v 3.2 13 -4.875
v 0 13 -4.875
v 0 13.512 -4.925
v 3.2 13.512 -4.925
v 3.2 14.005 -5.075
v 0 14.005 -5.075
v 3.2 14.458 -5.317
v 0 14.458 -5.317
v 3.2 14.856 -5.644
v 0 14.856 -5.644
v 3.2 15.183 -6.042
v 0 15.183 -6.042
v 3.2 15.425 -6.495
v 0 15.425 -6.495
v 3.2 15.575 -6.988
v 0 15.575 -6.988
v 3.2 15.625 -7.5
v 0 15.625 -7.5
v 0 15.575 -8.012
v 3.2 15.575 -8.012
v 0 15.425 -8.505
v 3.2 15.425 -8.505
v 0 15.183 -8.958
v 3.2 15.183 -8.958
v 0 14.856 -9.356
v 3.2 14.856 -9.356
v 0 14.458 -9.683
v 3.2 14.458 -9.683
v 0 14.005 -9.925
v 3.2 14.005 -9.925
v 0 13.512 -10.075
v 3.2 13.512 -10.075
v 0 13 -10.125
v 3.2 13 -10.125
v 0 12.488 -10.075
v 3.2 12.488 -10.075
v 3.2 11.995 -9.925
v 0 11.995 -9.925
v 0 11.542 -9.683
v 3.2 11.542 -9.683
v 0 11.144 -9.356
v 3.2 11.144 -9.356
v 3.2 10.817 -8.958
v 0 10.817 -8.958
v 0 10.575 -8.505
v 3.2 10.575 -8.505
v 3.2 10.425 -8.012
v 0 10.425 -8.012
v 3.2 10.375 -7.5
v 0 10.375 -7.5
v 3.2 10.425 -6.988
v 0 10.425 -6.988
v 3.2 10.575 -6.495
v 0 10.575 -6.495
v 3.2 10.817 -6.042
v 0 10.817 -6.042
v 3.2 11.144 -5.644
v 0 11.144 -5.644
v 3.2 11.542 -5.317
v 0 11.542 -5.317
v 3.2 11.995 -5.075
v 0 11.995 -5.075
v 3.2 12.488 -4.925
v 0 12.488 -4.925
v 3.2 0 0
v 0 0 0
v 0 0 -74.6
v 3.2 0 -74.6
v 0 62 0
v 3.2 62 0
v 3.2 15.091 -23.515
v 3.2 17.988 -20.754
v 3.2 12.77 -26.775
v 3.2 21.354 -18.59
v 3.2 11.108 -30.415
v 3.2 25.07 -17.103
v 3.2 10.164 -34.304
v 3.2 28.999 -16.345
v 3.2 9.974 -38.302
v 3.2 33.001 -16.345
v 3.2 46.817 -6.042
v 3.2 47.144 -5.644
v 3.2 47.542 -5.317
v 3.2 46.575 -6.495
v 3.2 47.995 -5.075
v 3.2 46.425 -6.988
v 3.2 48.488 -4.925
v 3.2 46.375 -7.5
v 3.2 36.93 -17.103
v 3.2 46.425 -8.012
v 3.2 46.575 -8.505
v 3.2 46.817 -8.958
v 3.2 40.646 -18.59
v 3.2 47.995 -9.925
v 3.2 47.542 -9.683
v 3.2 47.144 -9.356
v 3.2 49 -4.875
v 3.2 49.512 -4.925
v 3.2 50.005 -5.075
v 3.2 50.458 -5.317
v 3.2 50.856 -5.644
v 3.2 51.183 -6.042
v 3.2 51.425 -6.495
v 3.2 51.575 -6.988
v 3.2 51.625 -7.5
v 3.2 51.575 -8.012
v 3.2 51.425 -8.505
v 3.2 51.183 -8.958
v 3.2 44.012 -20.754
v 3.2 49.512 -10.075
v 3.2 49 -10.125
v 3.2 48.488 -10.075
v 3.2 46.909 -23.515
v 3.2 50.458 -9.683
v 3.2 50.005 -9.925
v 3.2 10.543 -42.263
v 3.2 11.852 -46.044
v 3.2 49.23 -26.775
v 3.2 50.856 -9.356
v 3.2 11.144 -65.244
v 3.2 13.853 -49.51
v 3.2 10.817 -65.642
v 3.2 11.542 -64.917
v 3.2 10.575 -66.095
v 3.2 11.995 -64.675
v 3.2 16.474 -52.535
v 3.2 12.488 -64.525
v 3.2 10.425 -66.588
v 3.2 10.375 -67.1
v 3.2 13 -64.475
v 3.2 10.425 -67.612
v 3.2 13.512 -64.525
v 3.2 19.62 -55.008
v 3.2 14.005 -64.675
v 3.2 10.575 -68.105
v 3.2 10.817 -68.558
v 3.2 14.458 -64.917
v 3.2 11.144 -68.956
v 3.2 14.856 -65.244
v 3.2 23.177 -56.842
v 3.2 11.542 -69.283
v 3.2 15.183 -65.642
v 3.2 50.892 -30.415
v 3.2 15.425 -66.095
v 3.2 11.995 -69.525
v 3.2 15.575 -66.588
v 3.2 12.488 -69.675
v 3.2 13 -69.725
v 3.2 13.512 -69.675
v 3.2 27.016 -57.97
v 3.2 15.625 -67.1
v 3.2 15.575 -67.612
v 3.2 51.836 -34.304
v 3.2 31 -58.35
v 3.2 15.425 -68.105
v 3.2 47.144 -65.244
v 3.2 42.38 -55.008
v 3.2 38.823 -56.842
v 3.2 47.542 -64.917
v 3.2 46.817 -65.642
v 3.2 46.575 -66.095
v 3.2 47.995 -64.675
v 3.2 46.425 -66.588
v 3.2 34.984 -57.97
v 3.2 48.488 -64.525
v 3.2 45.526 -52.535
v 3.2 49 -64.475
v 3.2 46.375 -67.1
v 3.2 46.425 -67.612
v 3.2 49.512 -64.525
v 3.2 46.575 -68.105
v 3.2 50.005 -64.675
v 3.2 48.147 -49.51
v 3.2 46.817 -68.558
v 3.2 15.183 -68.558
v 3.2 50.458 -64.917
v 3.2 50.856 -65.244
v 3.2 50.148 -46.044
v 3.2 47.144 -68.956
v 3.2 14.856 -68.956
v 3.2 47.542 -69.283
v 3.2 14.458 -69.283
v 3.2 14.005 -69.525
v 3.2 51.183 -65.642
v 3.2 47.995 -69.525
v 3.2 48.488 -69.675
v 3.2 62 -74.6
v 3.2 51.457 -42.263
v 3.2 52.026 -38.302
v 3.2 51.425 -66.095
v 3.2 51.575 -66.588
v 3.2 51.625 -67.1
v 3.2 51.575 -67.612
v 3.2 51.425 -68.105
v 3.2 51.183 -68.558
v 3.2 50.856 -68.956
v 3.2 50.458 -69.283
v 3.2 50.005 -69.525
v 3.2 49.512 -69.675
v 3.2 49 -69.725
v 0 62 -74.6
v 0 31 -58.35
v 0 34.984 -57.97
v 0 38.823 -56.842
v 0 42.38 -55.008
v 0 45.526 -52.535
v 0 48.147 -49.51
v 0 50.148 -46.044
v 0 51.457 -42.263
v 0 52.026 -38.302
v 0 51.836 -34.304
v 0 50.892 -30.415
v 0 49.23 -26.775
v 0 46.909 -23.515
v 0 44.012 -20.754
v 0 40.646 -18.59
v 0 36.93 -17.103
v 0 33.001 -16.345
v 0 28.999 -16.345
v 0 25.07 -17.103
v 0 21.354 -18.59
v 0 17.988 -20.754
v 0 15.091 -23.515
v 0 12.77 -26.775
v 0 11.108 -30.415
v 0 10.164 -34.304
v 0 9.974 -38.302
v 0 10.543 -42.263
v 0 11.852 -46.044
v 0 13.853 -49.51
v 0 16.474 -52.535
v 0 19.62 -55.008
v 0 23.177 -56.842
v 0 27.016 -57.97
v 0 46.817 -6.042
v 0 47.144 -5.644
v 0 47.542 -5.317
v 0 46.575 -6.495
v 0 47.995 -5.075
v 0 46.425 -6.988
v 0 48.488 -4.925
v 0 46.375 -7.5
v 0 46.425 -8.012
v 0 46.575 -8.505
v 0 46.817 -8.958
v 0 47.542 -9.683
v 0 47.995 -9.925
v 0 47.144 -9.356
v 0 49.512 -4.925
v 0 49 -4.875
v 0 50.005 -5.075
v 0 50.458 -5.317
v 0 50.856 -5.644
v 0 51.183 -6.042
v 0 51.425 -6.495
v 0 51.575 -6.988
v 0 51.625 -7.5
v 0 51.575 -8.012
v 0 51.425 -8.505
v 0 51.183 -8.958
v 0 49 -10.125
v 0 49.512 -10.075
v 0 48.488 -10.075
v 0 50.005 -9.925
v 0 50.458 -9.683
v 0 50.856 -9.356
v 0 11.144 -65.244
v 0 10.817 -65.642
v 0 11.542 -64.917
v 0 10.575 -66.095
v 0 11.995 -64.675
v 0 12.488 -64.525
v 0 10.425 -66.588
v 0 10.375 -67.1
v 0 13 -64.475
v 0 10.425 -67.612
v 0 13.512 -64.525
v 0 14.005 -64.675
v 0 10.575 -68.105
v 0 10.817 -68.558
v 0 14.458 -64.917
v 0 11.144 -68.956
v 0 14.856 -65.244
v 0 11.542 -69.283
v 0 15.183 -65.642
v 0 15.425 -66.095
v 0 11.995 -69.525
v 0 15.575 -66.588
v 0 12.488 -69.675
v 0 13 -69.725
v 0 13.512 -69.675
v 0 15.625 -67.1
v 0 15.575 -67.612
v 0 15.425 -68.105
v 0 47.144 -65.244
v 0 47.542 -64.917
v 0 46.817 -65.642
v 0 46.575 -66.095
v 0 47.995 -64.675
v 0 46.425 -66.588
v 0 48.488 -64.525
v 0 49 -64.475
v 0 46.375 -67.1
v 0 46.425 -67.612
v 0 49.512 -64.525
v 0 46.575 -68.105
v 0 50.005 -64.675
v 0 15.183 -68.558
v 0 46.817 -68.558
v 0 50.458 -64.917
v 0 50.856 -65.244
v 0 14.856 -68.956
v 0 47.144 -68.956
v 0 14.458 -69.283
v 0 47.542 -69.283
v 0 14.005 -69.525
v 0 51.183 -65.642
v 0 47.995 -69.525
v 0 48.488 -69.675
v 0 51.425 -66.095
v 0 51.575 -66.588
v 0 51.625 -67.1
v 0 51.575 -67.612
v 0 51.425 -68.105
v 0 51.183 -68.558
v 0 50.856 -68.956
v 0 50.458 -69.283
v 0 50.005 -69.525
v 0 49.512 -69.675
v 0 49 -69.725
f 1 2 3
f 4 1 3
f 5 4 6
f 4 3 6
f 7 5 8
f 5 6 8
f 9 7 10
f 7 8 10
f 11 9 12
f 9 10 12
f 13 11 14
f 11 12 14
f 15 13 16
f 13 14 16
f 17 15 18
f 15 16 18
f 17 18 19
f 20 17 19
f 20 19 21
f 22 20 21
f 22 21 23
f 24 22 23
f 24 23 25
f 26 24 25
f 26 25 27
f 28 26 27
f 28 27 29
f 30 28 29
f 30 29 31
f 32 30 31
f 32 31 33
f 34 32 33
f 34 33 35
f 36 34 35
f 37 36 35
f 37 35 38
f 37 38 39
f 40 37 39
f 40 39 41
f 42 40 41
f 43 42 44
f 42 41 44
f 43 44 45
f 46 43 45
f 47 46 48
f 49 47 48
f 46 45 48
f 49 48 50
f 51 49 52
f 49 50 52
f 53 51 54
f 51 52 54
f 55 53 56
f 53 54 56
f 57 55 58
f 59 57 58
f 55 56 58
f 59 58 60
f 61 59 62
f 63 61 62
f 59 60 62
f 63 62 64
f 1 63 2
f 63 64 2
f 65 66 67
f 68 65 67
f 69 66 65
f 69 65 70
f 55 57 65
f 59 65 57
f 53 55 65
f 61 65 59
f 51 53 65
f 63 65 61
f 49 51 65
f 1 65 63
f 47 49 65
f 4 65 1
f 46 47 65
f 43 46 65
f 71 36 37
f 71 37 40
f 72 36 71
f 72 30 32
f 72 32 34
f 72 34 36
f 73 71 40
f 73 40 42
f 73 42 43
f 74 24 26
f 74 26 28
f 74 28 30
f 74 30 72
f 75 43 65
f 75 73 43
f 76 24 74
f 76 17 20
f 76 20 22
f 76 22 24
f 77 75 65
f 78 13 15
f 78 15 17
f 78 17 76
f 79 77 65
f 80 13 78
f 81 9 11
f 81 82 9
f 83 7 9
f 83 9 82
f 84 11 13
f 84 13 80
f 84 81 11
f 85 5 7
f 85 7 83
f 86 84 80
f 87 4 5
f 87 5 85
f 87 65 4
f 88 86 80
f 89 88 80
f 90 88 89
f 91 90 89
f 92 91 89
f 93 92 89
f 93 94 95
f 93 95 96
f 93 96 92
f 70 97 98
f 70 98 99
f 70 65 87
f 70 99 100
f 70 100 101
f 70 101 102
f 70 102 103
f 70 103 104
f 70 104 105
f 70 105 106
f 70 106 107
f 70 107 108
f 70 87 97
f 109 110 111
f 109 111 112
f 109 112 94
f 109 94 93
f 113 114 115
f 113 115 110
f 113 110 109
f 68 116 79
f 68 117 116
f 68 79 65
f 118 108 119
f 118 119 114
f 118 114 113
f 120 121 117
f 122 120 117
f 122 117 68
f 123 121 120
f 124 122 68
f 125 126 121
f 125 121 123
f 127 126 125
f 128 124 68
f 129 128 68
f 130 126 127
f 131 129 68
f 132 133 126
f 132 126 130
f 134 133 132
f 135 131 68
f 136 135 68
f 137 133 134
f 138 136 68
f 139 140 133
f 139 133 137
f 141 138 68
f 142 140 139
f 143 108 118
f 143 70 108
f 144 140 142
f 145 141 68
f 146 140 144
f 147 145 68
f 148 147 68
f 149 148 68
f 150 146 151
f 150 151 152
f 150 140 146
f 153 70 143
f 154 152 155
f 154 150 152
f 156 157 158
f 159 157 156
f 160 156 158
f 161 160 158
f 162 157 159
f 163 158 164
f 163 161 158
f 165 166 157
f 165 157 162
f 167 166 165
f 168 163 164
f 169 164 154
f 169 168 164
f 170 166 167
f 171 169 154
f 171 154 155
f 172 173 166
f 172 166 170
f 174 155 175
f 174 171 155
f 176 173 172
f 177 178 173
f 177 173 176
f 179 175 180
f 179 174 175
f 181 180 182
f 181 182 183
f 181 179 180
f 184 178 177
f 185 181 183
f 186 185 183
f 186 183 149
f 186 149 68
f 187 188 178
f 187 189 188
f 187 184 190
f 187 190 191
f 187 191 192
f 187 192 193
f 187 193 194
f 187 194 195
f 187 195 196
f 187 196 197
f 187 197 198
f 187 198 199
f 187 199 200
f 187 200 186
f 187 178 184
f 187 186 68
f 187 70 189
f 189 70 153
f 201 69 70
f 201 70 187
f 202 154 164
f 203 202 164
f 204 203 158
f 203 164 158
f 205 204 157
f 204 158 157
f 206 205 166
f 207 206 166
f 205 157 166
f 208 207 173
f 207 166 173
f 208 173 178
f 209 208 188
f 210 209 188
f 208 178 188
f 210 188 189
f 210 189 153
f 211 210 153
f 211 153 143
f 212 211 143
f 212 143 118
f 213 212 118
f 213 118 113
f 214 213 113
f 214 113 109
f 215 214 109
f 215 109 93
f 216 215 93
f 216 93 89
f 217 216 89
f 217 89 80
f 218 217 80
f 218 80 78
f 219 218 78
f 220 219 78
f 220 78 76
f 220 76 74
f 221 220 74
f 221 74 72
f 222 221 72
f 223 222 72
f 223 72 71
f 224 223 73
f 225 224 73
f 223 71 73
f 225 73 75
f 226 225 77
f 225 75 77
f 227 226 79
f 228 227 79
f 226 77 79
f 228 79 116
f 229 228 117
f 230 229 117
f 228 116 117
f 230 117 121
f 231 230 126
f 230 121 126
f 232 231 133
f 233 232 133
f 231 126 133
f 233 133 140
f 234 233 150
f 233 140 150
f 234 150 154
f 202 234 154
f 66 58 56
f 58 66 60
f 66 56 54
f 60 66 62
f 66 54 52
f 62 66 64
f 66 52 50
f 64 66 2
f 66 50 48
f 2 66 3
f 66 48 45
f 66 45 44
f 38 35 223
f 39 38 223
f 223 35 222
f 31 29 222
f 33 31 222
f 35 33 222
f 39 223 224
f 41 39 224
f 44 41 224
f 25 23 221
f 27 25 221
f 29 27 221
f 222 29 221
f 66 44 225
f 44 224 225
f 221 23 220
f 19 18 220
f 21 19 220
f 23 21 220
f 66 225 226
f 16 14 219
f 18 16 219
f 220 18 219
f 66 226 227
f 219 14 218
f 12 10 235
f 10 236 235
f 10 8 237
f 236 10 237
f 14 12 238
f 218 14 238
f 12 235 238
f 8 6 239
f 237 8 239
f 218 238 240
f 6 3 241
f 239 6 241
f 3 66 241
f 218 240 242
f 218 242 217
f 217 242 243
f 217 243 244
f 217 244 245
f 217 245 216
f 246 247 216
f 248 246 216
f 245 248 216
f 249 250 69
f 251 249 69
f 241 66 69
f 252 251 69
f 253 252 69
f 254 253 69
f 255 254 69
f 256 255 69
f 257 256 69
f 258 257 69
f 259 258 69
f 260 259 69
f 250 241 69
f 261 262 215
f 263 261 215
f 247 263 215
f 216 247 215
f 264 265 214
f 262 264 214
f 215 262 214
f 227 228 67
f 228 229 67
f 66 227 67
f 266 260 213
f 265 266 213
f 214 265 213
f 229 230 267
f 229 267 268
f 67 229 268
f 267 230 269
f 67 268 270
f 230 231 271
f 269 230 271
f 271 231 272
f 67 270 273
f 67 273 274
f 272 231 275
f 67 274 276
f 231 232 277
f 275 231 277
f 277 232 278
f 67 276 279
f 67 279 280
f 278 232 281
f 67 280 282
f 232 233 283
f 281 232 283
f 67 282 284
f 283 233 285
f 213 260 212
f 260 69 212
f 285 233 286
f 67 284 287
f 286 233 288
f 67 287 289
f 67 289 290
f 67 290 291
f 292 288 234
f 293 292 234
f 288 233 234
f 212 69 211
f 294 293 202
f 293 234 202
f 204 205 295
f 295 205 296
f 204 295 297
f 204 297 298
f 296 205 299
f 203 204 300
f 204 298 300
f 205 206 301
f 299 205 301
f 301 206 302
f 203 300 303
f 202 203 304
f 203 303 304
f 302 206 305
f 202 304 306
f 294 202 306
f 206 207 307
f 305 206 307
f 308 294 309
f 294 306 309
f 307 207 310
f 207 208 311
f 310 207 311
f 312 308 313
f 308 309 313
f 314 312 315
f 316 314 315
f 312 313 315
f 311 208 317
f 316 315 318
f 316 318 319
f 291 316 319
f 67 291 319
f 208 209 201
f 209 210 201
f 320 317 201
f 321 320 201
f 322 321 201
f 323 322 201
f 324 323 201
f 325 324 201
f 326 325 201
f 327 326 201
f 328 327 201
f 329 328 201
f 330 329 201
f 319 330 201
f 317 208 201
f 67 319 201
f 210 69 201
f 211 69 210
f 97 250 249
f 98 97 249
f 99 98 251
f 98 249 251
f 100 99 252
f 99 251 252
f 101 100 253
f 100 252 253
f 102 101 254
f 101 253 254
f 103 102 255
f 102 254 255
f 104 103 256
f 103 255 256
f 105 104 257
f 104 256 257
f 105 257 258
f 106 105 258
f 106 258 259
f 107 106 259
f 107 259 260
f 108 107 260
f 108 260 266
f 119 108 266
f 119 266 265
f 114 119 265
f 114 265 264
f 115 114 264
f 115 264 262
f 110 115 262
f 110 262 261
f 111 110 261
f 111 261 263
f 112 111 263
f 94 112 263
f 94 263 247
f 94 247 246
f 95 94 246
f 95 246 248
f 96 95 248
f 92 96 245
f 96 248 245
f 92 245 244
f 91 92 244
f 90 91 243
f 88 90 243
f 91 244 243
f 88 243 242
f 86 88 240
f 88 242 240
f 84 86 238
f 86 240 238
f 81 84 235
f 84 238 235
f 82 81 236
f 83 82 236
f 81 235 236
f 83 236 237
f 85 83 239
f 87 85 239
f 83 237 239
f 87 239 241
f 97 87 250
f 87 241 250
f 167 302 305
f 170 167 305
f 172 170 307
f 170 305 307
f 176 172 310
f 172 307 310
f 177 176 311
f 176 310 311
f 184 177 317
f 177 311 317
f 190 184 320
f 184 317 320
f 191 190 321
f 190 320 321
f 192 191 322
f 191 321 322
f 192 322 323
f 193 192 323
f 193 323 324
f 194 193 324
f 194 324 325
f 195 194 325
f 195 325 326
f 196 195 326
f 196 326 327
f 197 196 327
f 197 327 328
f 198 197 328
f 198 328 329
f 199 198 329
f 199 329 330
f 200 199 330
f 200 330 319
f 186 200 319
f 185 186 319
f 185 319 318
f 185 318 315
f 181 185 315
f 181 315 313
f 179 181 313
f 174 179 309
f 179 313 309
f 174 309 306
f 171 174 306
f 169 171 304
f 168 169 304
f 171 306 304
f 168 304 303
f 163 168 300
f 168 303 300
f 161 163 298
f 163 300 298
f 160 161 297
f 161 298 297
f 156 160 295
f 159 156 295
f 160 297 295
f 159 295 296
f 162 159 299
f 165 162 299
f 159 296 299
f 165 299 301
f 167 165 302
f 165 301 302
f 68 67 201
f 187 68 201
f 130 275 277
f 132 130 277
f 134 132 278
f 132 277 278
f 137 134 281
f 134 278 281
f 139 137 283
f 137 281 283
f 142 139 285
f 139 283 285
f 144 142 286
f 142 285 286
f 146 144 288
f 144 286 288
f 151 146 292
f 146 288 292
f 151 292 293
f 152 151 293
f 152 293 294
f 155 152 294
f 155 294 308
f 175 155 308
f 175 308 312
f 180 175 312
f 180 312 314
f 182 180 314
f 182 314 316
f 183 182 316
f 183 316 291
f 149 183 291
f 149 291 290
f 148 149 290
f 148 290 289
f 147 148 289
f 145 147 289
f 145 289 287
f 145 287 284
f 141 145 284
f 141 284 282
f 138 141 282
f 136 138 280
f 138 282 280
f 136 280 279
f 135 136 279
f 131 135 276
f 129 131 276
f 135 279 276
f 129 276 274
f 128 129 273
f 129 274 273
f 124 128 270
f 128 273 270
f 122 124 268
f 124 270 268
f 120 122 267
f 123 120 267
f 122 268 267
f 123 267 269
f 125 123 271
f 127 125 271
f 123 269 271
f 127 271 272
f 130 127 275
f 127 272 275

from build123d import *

# Parameters (mm, degrees)
SKETCH1_W           = 74.6
SKETCH1_H           = 62
BOSS_EXTRUDE1_DEPTH = 3.2
CUT_EXTRUDE1_REACH  = 5.2
SKETCH2_R           = 21.05
CUT_EXTRUDE2_REACH  = 5.2
SKETCH3_R           = 2.625


with BuildPart() as part:
    # Sketch1 → Boss-Extrude1 (new body)
    with BuildSketch(Plane(origin=(0, 0, 0), x_dir=(0, 0, -1), z_dir=(1, 0, 0))):
        with Locations((37.3, 31)):
            Rectangle(SKETCH1_W, SKETCH1_H)
    extrude(amount=BOSS_EXTRUDE1_DEPTH)

    # Sketch2 → Cut-Extrude1 (cut, up to next)
    with BuildSketch(Plane(origin=(3.2, 0, 0), x_dir=(0, 0, -1), z_dir=(1, 0, 0)), mode=Mode.PRIVATE) as cut_extrude1_sk1:
        with Locations((37.3, 31)):
            Circle(SKETCH2_R)
    cut_extrude1_tool1 = extrude(cut_extrude1_sk1.sketch, amount=-CUT_EXTRUDE1_REACH, mode=Mode.PRIVATE) & part.part
    add(cut_extrude1_tool1.solids().sort_by_distance((3.2, 31, -37.3))[0], mode=Mode.SUBTRACT)

    # Sketch3 → Cut-Extrude2 (cut, up to next)
    with BuildSketch(Plane.ZY, mode=Mode.PRIVATE) as cut_extrude2_sk1:
        with Locations((-67.1, 13)):
            Circle(SKETCH3_R)
    cut_extrude2_tool1 = extrude(cut_extrude2_sk1.sketch, amount=-CUT_EXTRUDE2_REACH, mode=Mode.PRIVATE) & part.part
    add(cut_extrude2_tool1.solids().sort_by_distance((0, 13, -67.1))[0], mode=Mode.SUBTRACT)
    # Sketch3 → Cut-Extrude2 (cut, up to next)
    with BuildSketch(Plane.ZY, mode=Mode.PRIVATE) as cut_extrude2_sk2:
        with Locations((-67.1, 49)):
            Circle(SKETCH3_R)
    cut_extrude2_tool2 = extrude(cut_extrude2_sk2.sketch, amount=-CUT_EXTRUDE2_REACH, mode=Mode.PRIVATE) & part.part
    add(cut_extrude2_tool2.solids().sort_by_distance((0, 49, -67.1))[0], mode=Mode.SUBTRACT)
    # Sketch3 → Cut-Extrude2 (cut, up to next)
    with BuildSketch(Plane.ZY, mode=Mode.PRIVATE) as cut_extrude2_sk3:
        with Locations((-7.5, 13)):
            Circle(SKETCH3_R)
    cut_extrude2_tool3 = extrude(cut_extrude2_sk3.sketch, amount=-CUT_EXTRUDE2_REACH, mode=Mode.PRIVATE) & part.part
    add(cut_extrude2_tool3.solids().sort_by_distance((0, 13, -7.5))[0], mode=Mode.SUBTRACT)
    # Sketch3 → Cut-Extrude2 (cut, up to next)
    with BuildSketch(Plane.ZY, mode=Mode.PRIVATE) as cut_extrude2_sk4:
        with Locations((-7.5, 49)):
            Circle(SKETCH3_R)
    cut_extrude2_tool4 = extrude(cut_extrude2_sk4.sketch, amount=-CUT_EXTRUDE2_REACH, mode=Mode.PRIVATE) & part.part
    add(cut_extrude2_tool4.solids().sort_by_distance((0, 49, -7.5))[0], mode=Mode.SUBTRACT)


solid = part.part
